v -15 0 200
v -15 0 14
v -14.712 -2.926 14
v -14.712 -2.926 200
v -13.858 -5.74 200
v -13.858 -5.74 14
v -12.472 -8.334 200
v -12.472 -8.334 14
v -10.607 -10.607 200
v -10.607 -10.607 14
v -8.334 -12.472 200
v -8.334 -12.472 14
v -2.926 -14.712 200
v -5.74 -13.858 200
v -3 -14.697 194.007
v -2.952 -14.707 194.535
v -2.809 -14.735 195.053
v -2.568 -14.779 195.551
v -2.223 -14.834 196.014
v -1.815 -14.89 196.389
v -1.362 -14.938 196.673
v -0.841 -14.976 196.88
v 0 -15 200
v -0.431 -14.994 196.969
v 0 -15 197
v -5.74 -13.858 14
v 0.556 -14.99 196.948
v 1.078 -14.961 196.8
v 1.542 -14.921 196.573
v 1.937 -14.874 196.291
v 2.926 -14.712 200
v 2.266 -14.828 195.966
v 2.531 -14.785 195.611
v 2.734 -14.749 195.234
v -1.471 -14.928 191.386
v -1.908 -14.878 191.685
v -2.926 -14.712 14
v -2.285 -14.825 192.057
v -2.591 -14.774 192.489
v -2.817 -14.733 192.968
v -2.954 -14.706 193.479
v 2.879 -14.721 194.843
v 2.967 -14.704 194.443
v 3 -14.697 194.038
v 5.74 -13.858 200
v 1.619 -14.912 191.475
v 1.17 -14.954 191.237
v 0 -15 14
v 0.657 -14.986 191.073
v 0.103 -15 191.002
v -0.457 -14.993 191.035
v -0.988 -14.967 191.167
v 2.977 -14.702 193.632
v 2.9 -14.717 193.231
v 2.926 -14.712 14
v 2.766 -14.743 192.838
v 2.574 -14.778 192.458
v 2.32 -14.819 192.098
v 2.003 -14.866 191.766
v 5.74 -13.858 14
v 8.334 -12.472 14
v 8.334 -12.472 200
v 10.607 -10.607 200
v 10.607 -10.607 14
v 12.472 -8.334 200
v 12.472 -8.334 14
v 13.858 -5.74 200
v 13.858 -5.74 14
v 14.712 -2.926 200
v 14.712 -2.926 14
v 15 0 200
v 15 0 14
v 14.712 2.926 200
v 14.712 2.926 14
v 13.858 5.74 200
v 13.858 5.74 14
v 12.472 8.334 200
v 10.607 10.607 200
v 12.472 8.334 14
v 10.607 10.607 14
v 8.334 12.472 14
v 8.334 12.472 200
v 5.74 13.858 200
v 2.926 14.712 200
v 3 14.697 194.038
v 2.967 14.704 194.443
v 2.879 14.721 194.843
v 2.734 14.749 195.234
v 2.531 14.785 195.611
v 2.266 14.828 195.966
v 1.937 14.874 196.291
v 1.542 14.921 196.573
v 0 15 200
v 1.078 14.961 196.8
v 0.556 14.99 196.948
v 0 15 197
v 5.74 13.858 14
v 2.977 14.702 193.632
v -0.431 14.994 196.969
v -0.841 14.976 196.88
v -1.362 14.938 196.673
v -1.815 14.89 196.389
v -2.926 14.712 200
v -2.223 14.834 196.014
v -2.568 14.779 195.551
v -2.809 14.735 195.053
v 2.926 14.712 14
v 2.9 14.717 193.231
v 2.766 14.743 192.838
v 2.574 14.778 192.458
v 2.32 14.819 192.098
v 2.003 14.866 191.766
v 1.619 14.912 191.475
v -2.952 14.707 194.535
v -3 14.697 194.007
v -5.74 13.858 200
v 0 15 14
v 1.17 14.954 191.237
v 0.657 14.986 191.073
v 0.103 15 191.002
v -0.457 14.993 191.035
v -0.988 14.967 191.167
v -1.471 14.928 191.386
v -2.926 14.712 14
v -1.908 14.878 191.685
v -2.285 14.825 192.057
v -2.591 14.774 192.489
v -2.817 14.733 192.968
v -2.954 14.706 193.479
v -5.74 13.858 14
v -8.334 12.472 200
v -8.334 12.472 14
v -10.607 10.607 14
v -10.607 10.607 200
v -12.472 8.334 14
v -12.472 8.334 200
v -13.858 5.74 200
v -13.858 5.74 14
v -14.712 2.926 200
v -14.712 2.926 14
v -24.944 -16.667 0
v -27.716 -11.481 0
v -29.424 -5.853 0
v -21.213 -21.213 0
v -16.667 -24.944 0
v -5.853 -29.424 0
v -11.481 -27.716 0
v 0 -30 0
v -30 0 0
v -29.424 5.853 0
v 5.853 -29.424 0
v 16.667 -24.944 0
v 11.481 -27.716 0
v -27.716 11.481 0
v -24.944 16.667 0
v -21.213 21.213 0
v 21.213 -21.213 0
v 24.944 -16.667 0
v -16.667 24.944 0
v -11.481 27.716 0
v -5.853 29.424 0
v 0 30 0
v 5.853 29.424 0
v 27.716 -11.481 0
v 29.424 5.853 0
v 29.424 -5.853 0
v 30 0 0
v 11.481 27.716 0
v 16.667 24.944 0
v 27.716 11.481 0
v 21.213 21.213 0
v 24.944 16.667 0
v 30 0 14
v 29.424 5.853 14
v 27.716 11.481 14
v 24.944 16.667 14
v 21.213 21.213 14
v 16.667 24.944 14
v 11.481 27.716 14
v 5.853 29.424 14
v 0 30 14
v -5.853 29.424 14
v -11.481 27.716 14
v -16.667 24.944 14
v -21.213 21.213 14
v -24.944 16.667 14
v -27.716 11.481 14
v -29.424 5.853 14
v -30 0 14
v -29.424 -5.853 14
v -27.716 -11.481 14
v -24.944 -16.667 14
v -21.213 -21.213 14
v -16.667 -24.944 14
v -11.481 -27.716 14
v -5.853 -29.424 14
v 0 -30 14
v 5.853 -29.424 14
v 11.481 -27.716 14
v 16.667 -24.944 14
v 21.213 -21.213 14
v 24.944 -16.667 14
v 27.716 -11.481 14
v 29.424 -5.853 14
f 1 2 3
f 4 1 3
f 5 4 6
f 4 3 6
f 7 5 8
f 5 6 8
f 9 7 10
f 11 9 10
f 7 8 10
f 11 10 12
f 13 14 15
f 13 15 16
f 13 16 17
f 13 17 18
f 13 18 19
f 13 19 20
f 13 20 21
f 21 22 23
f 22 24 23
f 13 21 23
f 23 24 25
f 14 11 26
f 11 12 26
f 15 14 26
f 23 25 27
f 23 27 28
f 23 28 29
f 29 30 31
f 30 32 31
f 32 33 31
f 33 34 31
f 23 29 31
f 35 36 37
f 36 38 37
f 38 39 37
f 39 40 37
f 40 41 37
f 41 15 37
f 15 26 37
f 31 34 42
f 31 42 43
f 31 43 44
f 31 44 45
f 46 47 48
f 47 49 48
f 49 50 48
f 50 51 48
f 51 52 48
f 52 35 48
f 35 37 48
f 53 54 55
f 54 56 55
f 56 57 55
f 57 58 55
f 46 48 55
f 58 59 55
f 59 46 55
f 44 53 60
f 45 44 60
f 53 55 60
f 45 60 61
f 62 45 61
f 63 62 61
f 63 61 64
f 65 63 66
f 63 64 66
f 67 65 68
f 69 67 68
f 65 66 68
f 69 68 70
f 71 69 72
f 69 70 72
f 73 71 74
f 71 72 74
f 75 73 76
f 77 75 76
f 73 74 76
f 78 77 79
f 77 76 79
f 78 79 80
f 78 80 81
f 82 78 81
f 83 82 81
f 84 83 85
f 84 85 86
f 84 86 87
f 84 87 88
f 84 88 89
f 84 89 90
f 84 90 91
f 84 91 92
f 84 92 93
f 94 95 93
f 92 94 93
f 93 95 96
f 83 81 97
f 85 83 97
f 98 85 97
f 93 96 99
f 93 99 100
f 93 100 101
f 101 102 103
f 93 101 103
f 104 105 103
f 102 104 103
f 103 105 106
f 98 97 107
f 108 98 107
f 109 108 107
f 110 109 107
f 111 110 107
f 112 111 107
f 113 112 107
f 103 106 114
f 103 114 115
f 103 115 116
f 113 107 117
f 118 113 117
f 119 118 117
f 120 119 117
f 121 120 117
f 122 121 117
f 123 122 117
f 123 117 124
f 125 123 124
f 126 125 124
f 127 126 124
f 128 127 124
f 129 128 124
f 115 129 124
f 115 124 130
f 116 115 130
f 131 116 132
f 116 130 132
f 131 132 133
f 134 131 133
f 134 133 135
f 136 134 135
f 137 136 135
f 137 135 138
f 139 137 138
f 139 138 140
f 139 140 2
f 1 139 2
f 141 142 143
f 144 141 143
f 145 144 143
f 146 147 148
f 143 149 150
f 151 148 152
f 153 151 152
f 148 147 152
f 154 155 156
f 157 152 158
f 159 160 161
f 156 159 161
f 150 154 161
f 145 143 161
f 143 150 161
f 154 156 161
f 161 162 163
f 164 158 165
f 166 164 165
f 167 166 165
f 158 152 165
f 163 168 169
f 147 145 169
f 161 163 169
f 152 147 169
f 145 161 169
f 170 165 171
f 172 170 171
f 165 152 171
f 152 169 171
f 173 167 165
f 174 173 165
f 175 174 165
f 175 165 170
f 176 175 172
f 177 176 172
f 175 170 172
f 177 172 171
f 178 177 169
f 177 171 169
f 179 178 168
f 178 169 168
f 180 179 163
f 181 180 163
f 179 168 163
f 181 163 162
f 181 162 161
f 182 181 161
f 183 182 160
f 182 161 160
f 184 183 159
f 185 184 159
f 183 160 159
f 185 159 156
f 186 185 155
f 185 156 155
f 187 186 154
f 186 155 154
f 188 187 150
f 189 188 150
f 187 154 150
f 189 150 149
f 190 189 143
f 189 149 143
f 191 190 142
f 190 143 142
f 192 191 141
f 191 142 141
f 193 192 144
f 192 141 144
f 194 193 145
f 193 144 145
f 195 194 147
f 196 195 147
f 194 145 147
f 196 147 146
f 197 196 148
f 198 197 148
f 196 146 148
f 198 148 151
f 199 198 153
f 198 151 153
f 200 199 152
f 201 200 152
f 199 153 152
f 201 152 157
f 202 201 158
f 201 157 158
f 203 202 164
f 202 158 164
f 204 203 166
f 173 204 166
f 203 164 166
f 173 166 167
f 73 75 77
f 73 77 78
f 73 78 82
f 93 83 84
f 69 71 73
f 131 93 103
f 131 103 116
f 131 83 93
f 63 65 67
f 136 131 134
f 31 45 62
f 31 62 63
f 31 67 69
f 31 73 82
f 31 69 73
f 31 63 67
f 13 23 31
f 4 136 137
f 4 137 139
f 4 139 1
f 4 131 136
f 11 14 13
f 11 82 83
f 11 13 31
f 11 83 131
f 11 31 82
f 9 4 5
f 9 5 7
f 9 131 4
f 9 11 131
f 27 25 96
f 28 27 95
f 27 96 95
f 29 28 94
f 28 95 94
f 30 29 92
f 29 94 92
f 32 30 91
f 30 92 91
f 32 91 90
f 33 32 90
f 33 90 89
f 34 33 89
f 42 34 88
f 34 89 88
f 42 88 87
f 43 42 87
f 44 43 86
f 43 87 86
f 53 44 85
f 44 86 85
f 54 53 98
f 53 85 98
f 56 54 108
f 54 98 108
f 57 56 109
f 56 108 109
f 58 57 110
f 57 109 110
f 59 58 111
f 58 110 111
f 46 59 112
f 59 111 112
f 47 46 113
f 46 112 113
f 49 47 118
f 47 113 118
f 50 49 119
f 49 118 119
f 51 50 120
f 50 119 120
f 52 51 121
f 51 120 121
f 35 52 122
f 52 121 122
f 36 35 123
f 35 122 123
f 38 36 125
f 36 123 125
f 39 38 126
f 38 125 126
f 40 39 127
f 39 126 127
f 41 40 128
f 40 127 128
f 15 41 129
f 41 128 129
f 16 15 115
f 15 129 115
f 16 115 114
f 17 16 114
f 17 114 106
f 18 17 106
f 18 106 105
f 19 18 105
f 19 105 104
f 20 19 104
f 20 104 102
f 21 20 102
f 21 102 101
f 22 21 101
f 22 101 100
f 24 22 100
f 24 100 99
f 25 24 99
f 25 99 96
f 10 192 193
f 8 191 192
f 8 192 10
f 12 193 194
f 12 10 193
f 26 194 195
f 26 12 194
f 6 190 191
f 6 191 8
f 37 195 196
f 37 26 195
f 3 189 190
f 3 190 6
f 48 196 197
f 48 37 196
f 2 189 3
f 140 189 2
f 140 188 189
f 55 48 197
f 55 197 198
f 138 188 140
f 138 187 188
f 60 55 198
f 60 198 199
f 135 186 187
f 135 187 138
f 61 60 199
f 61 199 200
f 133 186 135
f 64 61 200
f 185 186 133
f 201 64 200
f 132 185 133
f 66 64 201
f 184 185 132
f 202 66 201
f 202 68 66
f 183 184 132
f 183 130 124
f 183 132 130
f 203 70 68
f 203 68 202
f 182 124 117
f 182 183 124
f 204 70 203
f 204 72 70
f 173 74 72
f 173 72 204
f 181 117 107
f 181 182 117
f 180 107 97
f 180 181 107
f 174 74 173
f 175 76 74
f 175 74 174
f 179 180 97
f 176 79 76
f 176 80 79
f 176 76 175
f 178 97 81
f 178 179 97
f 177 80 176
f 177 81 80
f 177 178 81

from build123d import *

# Parameters (mm, degrees)
SKETCH1_R           = 30
BOSS_EXTRUDE1_DEPTH = 14
SKETCH2_R           = 15
BOSS_EXTRUDE2_DEPTH = 186
SKETCH3_R           = 3
CUT_EXTRUDE1_DEPTH  = 93


with BuildPart() as part:
    # Sketch1 → Boss-Extrude1 (new body)
    with BuildSketch(Plane.XY):
        Circle(SKETCH1_R)
    extrude(amount=BOSS_EXTRUDE1_DEPTH)

    # Sketch2 → Boss-Extrude2 (add)
    with BuildSketch(Plane.XY.offset(14)):
        with Locations(Location((0, 0, 0), (0, 0, 180))):
            Circle(SKETCH2_R)
    extrude(amount=BOSS_EXTRUDE2_DEPTH)

    # Sketch3 → Cut-Extrude1 (cut, symmetric)
    with BuildSketch(Plane(origin=(0, 0, 0), x_dir=(1, 0, 0), z_dir=(0, 1, 0))):
        with Locations(Location((0, -194, 0), (0, 0, 270))):
            Circle(SKETCH3_R)
    extrude(amount=CUT_EXTRUDE1_DEPTH, both=True, mode=Mode.SUBTRACT)


solid = part.part
